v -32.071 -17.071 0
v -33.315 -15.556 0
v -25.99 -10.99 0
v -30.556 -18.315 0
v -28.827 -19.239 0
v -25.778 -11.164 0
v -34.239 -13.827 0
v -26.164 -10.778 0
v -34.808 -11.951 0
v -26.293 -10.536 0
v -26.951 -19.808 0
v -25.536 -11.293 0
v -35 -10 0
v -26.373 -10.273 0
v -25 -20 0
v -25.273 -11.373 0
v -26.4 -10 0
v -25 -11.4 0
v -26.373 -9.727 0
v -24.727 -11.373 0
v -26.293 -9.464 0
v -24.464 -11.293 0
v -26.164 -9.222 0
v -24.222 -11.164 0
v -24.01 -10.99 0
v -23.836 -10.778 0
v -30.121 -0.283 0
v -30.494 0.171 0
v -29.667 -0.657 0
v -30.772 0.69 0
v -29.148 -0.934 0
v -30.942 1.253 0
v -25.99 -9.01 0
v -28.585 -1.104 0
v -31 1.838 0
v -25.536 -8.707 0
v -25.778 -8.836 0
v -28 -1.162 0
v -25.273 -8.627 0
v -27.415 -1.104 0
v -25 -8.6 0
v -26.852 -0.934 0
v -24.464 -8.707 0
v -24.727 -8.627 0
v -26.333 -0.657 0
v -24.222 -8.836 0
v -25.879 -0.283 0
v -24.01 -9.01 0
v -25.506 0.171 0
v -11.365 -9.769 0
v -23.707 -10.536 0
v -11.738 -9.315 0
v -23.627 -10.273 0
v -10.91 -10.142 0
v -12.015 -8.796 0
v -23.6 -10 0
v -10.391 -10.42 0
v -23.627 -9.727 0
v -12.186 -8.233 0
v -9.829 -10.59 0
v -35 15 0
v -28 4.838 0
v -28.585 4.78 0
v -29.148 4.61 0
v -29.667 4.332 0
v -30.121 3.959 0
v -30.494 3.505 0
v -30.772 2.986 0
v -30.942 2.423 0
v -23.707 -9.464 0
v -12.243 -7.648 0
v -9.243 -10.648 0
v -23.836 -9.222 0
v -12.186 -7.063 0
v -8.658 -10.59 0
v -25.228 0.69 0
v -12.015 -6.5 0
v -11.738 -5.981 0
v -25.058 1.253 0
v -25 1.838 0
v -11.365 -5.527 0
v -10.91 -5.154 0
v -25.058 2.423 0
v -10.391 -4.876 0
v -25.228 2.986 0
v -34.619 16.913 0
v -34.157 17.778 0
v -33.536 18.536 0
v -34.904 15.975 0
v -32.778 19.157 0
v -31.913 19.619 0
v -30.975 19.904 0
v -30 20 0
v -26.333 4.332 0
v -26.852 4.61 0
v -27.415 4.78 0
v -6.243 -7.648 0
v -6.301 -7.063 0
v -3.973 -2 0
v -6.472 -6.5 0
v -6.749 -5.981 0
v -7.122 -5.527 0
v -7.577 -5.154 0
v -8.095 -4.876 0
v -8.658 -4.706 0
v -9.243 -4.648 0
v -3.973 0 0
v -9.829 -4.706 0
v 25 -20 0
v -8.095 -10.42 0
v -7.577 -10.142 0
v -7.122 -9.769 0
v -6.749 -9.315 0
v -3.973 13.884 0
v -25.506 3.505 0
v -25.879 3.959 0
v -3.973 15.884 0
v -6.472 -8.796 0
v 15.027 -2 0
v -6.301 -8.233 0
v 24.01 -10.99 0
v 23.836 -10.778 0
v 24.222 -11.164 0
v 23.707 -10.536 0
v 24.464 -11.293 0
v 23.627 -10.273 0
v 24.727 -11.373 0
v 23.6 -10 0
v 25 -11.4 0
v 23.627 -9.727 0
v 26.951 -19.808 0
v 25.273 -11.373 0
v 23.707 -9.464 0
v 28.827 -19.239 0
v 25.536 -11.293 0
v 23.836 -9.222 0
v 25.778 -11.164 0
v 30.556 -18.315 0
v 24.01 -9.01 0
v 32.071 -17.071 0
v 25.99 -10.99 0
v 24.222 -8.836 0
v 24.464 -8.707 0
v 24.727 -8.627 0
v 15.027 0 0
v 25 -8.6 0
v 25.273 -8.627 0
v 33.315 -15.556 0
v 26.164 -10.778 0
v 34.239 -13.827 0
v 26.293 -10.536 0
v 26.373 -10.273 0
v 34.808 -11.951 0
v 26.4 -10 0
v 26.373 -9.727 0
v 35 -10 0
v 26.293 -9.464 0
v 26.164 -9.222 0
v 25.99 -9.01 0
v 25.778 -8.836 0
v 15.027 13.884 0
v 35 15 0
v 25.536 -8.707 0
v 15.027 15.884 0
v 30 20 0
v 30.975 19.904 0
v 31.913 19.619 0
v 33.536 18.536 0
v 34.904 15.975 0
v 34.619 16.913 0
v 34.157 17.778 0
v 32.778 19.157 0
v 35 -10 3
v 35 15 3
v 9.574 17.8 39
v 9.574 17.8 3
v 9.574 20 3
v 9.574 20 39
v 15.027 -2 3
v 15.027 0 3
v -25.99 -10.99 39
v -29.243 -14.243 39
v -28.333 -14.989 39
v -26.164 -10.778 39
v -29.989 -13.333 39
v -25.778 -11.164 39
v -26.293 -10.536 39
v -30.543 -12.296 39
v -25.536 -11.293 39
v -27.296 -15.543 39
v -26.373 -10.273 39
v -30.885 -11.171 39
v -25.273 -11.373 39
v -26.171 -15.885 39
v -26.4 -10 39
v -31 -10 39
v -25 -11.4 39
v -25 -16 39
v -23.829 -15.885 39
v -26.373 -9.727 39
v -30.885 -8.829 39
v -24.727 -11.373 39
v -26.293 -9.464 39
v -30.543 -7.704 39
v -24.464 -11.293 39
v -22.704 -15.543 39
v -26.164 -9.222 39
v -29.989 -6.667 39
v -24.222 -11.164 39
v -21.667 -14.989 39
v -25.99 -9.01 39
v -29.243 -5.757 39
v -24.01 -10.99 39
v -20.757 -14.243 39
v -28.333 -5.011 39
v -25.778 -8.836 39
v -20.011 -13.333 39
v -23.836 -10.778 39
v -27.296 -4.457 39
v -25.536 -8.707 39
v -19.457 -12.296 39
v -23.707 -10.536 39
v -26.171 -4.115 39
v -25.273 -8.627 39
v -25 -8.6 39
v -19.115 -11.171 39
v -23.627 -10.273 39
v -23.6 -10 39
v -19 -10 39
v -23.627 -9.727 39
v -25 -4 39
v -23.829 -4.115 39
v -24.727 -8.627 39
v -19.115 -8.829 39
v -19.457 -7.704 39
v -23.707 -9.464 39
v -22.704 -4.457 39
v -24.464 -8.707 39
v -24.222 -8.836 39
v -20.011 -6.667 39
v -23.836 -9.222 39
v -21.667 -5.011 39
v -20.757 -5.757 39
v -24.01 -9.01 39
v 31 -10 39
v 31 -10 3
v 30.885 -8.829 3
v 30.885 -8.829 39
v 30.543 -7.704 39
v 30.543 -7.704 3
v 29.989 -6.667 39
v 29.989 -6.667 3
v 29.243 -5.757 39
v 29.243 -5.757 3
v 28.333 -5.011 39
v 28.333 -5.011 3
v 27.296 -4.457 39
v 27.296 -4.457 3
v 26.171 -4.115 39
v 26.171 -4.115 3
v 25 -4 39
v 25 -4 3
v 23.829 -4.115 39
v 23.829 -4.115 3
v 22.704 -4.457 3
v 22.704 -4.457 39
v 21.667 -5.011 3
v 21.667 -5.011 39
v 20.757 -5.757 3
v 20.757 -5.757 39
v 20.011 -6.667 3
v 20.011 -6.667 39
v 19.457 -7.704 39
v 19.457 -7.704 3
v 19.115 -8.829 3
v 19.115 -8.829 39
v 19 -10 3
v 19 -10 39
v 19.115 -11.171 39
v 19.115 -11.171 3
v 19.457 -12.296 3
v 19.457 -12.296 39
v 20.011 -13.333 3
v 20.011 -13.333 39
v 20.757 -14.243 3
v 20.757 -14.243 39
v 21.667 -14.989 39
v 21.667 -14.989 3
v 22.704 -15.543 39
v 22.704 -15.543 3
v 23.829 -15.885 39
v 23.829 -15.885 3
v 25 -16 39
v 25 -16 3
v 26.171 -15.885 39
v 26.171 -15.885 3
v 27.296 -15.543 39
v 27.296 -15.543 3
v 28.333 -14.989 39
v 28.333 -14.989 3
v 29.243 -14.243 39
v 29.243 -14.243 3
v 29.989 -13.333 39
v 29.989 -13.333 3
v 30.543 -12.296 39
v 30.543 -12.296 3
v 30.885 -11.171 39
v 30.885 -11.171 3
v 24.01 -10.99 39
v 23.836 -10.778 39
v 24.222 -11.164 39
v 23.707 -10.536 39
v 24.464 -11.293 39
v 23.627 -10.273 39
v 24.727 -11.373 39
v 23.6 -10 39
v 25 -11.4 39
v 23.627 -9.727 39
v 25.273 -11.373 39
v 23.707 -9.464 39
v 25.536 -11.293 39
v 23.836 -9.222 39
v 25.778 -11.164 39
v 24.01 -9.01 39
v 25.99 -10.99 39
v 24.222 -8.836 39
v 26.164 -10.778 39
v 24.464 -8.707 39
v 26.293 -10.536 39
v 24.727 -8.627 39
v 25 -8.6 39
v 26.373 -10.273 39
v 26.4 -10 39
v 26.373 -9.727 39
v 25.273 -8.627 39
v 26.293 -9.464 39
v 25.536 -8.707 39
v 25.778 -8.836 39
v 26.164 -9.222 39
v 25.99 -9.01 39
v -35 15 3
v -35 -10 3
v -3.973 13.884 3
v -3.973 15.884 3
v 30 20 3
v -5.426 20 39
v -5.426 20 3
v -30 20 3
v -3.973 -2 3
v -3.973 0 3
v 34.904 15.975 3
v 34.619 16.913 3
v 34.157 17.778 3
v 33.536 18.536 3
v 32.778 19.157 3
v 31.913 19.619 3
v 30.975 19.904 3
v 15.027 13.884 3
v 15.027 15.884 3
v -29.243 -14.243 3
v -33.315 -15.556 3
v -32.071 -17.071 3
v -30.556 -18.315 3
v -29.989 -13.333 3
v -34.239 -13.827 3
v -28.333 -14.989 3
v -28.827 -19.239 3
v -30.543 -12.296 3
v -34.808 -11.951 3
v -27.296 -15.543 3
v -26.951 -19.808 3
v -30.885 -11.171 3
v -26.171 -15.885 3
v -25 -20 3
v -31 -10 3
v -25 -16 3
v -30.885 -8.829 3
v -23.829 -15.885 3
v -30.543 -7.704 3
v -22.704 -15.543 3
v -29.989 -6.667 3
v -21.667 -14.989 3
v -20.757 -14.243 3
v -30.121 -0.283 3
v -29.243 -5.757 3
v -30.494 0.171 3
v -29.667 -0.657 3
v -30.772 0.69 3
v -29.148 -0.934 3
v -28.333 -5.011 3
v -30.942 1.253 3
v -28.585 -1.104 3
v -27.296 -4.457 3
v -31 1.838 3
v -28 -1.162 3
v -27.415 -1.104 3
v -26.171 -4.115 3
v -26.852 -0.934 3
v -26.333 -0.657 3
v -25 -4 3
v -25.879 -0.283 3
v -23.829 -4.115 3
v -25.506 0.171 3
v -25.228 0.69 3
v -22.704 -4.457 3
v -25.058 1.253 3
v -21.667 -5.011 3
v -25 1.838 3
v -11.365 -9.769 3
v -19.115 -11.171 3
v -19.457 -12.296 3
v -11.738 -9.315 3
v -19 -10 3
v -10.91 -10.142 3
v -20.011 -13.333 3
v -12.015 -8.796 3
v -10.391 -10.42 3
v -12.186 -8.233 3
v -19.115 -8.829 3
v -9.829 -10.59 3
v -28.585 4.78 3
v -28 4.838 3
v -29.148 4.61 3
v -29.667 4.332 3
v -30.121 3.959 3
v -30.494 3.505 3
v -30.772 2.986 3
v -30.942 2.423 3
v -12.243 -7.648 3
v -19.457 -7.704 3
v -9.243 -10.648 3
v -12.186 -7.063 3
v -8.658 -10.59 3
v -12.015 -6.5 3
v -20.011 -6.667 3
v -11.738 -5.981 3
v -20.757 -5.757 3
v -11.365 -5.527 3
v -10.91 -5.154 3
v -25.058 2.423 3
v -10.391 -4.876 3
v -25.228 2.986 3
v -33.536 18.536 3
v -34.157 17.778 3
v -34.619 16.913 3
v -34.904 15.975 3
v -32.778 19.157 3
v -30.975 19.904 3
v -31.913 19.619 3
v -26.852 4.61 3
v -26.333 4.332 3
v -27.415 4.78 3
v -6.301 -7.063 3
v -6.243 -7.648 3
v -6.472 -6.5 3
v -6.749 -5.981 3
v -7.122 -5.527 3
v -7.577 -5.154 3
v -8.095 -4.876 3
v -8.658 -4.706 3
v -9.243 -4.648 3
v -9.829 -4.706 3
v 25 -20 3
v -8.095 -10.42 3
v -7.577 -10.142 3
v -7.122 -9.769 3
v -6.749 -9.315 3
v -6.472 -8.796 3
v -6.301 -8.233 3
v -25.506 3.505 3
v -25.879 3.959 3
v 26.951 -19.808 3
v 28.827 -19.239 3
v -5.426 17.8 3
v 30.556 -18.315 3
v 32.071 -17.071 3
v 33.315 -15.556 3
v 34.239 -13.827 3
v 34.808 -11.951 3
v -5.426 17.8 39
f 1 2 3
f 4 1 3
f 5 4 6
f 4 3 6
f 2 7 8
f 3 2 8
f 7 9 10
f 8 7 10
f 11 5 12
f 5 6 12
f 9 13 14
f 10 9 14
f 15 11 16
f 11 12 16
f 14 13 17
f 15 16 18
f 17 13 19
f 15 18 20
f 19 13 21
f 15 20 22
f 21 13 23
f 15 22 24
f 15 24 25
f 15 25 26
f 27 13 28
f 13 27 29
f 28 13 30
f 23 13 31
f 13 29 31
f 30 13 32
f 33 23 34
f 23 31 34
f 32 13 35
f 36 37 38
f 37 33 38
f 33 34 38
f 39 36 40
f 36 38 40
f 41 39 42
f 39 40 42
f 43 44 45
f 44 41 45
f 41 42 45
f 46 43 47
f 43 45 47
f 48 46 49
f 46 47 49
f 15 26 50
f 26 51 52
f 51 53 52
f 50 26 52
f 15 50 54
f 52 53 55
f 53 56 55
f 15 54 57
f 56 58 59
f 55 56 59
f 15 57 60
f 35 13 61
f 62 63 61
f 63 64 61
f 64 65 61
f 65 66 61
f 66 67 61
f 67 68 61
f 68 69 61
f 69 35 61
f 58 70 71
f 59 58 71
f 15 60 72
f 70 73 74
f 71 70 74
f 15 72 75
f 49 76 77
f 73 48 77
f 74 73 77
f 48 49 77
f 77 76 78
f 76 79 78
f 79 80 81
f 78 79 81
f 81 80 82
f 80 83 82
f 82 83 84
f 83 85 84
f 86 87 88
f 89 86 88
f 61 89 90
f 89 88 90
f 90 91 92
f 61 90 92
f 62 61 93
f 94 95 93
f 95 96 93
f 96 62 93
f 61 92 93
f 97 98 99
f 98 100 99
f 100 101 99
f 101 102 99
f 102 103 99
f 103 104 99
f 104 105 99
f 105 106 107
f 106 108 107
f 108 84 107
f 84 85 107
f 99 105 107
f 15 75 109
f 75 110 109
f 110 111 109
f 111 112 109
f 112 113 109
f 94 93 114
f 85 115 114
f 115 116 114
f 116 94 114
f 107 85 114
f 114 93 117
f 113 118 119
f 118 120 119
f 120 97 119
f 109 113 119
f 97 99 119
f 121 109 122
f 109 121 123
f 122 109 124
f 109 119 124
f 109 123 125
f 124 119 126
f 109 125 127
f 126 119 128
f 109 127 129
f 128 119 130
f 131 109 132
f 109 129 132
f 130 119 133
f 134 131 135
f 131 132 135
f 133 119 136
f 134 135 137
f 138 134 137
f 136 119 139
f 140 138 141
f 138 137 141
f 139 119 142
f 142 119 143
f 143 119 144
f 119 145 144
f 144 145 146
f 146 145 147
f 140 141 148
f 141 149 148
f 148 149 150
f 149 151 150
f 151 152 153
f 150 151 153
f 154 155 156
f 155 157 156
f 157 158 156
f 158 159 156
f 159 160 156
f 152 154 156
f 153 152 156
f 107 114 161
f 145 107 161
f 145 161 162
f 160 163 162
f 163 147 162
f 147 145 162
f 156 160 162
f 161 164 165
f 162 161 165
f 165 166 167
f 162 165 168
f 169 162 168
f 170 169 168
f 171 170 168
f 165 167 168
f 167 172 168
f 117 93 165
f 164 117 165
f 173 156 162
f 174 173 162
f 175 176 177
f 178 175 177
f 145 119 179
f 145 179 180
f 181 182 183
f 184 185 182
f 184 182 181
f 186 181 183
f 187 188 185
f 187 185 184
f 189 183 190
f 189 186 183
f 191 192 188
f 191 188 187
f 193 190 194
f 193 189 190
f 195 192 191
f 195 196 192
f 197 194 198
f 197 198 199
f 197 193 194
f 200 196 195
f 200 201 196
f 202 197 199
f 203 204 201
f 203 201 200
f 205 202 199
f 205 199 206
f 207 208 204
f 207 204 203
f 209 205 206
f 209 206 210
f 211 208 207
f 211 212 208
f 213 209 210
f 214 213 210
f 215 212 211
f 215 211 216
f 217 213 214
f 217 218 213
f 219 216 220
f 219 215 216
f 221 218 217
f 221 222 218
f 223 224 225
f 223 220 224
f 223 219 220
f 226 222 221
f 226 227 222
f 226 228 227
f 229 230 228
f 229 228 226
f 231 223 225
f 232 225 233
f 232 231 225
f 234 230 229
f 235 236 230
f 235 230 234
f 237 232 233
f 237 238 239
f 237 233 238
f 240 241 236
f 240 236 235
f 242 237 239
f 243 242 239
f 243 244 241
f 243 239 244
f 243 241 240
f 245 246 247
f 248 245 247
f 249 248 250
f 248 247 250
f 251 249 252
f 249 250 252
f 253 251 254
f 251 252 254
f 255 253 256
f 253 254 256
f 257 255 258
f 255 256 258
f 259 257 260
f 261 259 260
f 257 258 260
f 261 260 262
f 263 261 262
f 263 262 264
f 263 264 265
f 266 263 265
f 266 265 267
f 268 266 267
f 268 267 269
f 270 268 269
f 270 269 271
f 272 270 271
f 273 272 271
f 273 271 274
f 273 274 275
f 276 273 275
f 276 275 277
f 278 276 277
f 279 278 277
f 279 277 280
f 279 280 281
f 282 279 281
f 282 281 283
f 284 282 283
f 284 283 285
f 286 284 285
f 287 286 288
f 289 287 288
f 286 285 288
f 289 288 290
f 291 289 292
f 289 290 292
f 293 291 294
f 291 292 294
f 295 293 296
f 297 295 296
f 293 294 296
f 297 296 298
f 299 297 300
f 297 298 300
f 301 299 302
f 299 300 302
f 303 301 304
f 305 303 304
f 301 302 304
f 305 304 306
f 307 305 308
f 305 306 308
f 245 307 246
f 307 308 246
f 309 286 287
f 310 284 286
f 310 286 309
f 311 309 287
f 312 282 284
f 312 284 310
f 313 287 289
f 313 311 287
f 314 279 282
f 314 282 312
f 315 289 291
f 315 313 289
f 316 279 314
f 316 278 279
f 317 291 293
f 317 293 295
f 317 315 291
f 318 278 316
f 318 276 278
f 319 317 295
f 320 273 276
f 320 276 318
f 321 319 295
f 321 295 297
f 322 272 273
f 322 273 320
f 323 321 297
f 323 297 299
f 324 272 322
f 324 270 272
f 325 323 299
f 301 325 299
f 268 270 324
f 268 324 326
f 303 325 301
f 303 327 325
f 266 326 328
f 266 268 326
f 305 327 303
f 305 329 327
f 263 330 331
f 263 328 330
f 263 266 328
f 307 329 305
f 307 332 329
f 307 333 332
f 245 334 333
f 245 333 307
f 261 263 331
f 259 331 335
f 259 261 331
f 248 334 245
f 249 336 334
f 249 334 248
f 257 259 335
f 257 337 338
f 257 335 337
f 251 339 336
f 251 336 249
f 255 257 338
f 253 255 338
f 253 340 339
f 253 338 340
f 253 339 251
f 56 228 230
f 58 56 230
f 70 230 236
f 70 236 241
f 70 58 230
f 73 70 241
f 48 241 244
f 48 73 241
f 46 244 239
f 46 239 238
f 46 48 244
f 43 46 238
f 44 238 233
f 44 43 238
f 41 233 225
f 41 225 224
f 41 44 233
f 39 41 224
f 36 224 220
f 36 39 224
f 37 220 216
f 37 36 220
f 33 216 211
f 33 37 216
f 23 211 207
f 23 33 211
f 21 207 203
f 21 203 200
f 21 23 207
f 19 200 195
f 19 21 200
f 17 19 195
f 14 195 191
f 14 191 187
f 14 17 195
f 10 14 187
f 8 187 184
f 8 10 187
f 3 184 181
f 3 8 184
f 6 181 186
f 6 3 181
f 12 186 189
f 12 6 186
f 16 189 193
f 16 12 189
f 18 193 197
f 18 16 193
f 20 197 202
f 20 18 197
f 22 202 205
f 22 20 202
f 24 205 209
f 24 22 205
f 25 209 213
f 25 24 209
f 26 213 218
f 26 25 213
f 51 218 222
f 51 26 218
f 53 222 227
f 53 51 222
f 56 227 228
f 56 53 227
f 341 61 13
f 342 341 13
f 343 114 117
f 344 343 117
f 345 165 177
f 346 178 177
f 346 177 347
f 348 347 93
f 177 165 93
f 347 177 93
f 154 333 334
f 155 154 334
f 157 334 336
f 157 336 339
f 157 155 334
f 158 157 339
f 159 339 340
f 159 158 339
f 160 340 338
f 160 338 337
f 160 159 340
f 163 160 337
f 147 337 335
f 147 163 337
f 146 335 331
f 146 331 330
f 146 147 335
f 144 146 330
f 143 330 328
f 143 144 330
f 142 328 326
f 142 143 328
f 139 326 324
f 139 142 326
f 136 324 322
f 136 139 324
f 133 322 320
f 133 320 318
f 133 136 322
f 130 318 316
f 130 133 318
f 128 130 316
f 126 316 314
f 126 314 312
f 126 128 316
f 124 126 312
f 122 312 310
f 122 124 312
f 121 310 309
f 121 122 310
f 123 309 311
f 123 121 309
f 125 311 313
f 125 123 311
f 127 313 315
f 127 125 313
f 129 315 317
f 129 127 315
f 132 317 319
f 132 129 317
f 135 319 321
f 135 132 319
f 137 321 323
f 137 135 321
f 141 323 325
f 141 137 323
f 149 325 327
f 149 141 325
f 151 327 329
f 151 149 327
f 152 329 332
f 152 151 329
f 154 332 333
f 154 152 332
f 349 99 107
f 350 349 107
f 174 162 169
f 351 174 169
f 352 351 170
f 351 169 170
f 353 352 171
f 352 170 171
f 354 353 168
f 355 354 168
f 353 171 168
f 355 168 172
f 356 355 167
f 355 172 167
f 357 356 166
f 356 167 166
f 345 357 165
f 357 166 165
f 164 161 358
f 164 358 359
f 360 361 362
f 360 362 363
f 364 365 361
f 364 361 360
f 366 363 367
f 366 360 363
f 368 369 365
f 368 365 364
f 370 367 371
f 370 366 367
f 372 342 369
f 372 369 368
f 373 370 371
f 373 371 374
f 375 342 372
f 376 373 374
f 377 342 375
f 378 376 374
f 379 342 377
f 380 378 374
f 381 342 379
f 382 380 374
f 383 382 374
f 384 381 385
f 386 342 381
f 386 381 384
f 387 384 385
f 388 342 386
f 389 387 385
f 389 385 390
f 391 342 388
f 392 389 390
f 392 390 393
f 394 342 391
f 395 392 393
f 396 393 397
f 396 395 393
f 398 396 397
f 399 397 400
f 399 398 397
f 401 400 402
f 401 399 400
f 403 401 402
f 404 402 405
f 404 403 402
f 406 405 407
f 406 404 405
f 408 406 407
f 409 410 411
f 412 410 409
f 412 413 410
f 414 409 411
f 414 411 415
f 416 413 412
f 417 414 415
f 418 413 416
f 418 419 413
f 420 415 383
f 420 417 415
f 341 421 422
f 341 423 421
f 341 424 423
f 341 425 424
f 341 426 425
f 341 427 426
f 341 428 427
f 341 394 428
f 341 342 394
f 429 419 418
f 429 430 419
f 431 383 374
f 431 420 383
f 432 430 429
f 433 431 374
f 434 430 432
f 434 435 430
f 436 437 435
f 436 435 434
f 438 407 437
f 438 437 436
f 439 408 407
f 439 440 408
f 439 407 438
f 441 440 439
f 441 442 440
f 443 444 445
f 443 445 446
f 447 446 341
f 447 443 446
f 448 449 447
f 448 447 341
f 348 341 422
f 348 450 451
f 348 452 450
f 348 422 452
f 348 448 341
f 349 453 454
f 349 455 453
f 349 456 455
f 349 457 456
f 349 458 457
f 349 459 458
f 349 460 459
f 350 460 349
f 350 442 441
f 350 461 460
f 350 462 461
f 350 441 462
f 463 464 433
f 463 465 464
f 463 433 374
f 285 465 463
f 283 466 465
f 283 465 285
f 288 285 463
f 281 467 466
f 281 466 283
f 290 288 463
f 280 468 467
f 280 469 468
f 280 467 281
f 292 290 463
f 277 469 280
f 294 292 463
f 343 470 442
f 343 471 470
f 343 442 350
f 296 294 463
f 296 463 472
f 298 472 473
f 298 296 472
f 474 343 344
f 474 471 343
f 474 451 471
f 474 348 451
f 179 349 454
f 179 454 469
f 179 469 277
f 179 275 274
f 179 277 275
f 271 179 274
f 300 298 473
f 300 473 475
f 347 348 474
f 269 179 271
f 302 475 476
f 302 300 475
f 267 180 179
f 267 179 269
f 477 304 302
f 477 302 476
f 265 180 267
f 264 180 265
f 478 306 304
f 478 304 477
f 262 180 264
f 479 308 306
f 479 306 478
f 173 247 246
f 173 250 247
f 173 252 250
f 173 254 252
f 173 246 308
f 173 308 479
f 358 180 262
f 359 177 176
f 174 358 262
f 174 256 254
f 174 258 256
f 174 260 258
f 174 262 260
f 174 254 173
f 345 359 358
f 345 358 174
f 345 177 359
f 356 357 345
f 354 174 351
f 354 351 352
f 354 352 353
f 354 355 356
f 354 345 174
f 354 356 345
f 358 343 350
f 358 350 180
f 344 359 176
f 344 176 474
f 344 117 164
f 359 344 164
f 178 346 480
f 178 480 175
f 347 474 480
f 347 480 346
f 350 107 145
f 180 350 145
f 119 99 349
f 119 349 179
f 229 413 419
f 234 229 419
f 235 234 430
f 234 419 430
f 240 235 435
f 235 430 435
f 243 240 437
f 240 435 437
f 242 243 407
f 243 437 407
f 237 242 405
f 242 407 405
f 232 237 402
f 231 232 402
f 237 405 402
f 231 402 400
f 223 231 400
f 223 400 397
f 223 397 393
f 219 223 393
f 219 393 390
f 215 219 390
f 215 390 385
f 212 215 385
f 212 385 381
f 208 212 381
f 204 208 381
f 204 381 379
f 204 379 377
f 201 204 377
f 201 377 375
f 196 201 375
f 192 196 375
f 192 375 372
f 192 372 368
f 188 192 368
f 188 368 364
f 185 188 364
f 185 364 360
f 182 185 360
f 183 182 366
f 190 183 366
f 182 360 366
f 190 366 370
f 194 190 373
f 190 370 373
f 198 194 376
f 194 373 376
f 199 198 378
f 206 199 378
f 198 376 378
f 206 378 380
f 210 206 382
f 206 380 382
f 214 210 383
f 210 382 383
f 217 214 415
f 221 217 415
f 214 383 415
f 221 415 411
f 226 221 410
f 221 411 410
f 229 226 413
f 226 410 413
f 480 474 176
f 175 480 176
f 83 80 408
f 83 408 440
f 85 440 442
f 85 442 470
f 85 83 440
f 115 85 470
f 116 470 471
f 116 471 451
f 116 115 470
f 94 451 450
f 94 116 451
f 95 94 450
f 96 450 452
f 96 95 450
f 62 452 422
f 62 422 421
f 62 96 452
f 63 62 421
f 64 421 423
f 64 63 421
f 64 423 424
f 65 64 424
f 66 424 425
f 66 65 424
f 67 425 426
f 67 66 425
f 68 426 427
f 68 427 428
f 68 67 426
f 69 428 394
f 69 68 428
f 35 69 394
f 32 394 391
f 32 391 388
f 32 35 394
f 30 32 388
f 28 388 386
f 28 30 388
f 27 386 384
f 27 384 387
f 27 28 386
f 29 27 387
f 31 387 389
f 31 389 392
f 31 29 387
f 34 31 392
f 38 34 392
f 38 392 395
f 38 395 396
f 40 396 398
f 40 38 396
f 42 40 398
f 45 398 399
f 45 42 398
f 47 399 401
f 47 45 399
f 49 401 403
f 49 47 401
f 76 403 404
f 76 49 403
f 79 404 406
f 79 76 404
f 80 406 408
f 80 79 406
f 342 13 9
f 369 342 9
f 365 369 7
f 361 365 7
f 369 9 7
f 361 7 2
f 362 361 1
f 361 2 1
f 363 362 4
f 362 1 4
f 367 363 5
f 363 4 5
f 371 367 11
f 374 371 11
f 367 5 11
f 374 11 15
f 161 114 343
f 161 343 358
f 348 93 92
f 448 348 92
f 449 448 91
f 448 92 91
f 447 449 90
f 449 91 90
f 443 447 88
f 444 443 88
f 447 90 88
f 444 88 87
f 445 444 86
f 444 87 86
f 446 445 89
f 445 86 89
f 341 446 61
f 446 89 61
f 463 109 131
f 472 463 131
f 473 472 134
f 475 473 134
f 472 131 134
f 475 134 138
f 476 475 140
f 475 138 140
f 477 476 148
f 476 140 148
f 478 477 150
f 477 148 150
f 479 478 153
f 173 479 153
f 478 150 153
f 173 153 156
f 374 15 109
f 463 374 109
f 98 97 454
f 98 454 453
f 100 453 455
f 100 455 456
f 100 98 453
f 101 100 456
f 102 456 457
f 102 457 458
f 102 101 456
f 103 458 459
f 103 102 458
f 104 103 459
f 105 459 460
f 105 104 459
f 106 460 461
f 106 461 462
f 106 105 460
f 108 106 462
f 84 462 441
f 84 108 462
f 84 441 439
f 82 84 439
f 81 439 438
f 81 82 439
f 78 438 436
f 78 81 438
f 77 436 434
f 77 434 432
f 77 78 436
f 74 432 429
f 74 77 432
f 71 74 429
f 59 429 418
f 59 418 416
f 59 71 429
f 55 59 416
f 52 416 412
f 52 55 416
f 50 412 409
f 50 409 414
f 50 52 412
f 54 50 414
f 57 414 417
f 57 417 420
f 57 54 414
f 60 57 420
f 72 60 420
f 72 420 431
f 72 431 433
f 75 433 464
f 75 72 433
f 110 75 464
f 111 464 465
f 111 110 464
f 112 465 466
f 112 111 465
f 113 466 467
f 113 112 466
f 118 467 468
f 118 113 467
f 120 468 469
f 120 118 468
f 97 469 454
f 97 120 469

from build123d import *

# Parameters (mm, degrees)
F0_R     = 6
F0_R_2   = 1.4
F1_DEPTH = 39
F0_W     = 15
F0_H     = 2.2
F0_R_3   = 3
F0_W_2   = 19
F0_H_2   = 2
F2_DEPTH = 3


with BuildPart() as f1:
    # F0 (on Top) → F1 (new body)
    with BuildSketch(Plane.XY):
        with Locations((25, -10)):
            Circle(F0_R)
        with Locations((25, -10)):
            Circle(F0_R_2, mode=Mode.SUBTRACT)
    extrude(amount=F1_DEPTH)



with BuildPart() as f1b:
    # F0 (on Top) → F1, piece 2 (new body)
    with BuildSketch(Plane.XY):
        with Locations((-25, -10)):
            Circle(F0_R)
        with Locations((-25, -10)):
            Circle(F0_R_2, mode=Mode.SUBTRACT)
    extrude(amount=F1_DEPTH)


with BuildPart() as f1c:
    # F0 (on Top) → F1, piece 3 (new body)
    with BuildSketch(Plane.XY):
        with Locations((2.0735195652, 18.9)):
            Rectangle(F0_W, F0_H)
    extrude(amount=F1_DEPTH)


with BuildPart() as f1_1:
    add(f1.part)

    add(f1b.part)  # F2 merges F1b

    add(f1c.part)  # F2 merges F1c
    # F0 (on Top) → F2 (join)
    with BuildSketch(Plane.XY):
        with BuildLine():
            ThreePointArc((35, 15), (33.5355339059, 18.5355339059), (30, 20))
            Line((30, 20), (9.5735195652, 20))
            Line((9.5735195652, 20), (9.5735195652, 17.8))
            Line((9.5735195652, 17.8), (-5.4264804348, 17.8))
            Line((-5.4264804348, 17.8), (-5.4264804348, 20))
            Line((-5.4264804348, 20), (-30, 20))
            ThreePointArc((-30, 20), (-33.5355339059, 18.5355339059), (-35, 15))
            Line((-35, 15), (-35, -10))
            ThreePointArc((-35, -10), (-32.0710678119, -17.0710678119), (-25, -20))
            Line((-25, -20), (25, -20))
            ThreePointArc((25, -20), (32.0710678119, -17.0710678119), (35, -10))
            Line((35, -10), (35, 15))
        make_face()
        with Locations((-25, -10)):
            Circle(F0_R, mode=Mode.SUBTRACT)
        with Locations((-9.2434035614, -7.6480722055)):
            Circle(F0_R_3, mode=Mode.SUBTRACT)
        with Locations((5.526580222, -1)):
            Rectangle(F0_W_2, F0_H_2, mode=Mode.SUBTRACT)
        with Locations((25, -10)):
            Circle(F0_R, mode=Mode.SUBTRACT)
        with Locations((-28, 1.8378978129)):
            Circle(F0_R_3, mode=Mode.SUBTRACT)
        with Locations((5.526580222, 14.8842966408)):
            Rectangle(F0_W_2, F0_H_2, mode=Mode.SUBTRACT)
        with Locations((2.0735195652, 18.9)):
            Rectangle(F0_W, F0_H)
    extrude(amount=F2_DEPTH)


solid = f1_1.part
